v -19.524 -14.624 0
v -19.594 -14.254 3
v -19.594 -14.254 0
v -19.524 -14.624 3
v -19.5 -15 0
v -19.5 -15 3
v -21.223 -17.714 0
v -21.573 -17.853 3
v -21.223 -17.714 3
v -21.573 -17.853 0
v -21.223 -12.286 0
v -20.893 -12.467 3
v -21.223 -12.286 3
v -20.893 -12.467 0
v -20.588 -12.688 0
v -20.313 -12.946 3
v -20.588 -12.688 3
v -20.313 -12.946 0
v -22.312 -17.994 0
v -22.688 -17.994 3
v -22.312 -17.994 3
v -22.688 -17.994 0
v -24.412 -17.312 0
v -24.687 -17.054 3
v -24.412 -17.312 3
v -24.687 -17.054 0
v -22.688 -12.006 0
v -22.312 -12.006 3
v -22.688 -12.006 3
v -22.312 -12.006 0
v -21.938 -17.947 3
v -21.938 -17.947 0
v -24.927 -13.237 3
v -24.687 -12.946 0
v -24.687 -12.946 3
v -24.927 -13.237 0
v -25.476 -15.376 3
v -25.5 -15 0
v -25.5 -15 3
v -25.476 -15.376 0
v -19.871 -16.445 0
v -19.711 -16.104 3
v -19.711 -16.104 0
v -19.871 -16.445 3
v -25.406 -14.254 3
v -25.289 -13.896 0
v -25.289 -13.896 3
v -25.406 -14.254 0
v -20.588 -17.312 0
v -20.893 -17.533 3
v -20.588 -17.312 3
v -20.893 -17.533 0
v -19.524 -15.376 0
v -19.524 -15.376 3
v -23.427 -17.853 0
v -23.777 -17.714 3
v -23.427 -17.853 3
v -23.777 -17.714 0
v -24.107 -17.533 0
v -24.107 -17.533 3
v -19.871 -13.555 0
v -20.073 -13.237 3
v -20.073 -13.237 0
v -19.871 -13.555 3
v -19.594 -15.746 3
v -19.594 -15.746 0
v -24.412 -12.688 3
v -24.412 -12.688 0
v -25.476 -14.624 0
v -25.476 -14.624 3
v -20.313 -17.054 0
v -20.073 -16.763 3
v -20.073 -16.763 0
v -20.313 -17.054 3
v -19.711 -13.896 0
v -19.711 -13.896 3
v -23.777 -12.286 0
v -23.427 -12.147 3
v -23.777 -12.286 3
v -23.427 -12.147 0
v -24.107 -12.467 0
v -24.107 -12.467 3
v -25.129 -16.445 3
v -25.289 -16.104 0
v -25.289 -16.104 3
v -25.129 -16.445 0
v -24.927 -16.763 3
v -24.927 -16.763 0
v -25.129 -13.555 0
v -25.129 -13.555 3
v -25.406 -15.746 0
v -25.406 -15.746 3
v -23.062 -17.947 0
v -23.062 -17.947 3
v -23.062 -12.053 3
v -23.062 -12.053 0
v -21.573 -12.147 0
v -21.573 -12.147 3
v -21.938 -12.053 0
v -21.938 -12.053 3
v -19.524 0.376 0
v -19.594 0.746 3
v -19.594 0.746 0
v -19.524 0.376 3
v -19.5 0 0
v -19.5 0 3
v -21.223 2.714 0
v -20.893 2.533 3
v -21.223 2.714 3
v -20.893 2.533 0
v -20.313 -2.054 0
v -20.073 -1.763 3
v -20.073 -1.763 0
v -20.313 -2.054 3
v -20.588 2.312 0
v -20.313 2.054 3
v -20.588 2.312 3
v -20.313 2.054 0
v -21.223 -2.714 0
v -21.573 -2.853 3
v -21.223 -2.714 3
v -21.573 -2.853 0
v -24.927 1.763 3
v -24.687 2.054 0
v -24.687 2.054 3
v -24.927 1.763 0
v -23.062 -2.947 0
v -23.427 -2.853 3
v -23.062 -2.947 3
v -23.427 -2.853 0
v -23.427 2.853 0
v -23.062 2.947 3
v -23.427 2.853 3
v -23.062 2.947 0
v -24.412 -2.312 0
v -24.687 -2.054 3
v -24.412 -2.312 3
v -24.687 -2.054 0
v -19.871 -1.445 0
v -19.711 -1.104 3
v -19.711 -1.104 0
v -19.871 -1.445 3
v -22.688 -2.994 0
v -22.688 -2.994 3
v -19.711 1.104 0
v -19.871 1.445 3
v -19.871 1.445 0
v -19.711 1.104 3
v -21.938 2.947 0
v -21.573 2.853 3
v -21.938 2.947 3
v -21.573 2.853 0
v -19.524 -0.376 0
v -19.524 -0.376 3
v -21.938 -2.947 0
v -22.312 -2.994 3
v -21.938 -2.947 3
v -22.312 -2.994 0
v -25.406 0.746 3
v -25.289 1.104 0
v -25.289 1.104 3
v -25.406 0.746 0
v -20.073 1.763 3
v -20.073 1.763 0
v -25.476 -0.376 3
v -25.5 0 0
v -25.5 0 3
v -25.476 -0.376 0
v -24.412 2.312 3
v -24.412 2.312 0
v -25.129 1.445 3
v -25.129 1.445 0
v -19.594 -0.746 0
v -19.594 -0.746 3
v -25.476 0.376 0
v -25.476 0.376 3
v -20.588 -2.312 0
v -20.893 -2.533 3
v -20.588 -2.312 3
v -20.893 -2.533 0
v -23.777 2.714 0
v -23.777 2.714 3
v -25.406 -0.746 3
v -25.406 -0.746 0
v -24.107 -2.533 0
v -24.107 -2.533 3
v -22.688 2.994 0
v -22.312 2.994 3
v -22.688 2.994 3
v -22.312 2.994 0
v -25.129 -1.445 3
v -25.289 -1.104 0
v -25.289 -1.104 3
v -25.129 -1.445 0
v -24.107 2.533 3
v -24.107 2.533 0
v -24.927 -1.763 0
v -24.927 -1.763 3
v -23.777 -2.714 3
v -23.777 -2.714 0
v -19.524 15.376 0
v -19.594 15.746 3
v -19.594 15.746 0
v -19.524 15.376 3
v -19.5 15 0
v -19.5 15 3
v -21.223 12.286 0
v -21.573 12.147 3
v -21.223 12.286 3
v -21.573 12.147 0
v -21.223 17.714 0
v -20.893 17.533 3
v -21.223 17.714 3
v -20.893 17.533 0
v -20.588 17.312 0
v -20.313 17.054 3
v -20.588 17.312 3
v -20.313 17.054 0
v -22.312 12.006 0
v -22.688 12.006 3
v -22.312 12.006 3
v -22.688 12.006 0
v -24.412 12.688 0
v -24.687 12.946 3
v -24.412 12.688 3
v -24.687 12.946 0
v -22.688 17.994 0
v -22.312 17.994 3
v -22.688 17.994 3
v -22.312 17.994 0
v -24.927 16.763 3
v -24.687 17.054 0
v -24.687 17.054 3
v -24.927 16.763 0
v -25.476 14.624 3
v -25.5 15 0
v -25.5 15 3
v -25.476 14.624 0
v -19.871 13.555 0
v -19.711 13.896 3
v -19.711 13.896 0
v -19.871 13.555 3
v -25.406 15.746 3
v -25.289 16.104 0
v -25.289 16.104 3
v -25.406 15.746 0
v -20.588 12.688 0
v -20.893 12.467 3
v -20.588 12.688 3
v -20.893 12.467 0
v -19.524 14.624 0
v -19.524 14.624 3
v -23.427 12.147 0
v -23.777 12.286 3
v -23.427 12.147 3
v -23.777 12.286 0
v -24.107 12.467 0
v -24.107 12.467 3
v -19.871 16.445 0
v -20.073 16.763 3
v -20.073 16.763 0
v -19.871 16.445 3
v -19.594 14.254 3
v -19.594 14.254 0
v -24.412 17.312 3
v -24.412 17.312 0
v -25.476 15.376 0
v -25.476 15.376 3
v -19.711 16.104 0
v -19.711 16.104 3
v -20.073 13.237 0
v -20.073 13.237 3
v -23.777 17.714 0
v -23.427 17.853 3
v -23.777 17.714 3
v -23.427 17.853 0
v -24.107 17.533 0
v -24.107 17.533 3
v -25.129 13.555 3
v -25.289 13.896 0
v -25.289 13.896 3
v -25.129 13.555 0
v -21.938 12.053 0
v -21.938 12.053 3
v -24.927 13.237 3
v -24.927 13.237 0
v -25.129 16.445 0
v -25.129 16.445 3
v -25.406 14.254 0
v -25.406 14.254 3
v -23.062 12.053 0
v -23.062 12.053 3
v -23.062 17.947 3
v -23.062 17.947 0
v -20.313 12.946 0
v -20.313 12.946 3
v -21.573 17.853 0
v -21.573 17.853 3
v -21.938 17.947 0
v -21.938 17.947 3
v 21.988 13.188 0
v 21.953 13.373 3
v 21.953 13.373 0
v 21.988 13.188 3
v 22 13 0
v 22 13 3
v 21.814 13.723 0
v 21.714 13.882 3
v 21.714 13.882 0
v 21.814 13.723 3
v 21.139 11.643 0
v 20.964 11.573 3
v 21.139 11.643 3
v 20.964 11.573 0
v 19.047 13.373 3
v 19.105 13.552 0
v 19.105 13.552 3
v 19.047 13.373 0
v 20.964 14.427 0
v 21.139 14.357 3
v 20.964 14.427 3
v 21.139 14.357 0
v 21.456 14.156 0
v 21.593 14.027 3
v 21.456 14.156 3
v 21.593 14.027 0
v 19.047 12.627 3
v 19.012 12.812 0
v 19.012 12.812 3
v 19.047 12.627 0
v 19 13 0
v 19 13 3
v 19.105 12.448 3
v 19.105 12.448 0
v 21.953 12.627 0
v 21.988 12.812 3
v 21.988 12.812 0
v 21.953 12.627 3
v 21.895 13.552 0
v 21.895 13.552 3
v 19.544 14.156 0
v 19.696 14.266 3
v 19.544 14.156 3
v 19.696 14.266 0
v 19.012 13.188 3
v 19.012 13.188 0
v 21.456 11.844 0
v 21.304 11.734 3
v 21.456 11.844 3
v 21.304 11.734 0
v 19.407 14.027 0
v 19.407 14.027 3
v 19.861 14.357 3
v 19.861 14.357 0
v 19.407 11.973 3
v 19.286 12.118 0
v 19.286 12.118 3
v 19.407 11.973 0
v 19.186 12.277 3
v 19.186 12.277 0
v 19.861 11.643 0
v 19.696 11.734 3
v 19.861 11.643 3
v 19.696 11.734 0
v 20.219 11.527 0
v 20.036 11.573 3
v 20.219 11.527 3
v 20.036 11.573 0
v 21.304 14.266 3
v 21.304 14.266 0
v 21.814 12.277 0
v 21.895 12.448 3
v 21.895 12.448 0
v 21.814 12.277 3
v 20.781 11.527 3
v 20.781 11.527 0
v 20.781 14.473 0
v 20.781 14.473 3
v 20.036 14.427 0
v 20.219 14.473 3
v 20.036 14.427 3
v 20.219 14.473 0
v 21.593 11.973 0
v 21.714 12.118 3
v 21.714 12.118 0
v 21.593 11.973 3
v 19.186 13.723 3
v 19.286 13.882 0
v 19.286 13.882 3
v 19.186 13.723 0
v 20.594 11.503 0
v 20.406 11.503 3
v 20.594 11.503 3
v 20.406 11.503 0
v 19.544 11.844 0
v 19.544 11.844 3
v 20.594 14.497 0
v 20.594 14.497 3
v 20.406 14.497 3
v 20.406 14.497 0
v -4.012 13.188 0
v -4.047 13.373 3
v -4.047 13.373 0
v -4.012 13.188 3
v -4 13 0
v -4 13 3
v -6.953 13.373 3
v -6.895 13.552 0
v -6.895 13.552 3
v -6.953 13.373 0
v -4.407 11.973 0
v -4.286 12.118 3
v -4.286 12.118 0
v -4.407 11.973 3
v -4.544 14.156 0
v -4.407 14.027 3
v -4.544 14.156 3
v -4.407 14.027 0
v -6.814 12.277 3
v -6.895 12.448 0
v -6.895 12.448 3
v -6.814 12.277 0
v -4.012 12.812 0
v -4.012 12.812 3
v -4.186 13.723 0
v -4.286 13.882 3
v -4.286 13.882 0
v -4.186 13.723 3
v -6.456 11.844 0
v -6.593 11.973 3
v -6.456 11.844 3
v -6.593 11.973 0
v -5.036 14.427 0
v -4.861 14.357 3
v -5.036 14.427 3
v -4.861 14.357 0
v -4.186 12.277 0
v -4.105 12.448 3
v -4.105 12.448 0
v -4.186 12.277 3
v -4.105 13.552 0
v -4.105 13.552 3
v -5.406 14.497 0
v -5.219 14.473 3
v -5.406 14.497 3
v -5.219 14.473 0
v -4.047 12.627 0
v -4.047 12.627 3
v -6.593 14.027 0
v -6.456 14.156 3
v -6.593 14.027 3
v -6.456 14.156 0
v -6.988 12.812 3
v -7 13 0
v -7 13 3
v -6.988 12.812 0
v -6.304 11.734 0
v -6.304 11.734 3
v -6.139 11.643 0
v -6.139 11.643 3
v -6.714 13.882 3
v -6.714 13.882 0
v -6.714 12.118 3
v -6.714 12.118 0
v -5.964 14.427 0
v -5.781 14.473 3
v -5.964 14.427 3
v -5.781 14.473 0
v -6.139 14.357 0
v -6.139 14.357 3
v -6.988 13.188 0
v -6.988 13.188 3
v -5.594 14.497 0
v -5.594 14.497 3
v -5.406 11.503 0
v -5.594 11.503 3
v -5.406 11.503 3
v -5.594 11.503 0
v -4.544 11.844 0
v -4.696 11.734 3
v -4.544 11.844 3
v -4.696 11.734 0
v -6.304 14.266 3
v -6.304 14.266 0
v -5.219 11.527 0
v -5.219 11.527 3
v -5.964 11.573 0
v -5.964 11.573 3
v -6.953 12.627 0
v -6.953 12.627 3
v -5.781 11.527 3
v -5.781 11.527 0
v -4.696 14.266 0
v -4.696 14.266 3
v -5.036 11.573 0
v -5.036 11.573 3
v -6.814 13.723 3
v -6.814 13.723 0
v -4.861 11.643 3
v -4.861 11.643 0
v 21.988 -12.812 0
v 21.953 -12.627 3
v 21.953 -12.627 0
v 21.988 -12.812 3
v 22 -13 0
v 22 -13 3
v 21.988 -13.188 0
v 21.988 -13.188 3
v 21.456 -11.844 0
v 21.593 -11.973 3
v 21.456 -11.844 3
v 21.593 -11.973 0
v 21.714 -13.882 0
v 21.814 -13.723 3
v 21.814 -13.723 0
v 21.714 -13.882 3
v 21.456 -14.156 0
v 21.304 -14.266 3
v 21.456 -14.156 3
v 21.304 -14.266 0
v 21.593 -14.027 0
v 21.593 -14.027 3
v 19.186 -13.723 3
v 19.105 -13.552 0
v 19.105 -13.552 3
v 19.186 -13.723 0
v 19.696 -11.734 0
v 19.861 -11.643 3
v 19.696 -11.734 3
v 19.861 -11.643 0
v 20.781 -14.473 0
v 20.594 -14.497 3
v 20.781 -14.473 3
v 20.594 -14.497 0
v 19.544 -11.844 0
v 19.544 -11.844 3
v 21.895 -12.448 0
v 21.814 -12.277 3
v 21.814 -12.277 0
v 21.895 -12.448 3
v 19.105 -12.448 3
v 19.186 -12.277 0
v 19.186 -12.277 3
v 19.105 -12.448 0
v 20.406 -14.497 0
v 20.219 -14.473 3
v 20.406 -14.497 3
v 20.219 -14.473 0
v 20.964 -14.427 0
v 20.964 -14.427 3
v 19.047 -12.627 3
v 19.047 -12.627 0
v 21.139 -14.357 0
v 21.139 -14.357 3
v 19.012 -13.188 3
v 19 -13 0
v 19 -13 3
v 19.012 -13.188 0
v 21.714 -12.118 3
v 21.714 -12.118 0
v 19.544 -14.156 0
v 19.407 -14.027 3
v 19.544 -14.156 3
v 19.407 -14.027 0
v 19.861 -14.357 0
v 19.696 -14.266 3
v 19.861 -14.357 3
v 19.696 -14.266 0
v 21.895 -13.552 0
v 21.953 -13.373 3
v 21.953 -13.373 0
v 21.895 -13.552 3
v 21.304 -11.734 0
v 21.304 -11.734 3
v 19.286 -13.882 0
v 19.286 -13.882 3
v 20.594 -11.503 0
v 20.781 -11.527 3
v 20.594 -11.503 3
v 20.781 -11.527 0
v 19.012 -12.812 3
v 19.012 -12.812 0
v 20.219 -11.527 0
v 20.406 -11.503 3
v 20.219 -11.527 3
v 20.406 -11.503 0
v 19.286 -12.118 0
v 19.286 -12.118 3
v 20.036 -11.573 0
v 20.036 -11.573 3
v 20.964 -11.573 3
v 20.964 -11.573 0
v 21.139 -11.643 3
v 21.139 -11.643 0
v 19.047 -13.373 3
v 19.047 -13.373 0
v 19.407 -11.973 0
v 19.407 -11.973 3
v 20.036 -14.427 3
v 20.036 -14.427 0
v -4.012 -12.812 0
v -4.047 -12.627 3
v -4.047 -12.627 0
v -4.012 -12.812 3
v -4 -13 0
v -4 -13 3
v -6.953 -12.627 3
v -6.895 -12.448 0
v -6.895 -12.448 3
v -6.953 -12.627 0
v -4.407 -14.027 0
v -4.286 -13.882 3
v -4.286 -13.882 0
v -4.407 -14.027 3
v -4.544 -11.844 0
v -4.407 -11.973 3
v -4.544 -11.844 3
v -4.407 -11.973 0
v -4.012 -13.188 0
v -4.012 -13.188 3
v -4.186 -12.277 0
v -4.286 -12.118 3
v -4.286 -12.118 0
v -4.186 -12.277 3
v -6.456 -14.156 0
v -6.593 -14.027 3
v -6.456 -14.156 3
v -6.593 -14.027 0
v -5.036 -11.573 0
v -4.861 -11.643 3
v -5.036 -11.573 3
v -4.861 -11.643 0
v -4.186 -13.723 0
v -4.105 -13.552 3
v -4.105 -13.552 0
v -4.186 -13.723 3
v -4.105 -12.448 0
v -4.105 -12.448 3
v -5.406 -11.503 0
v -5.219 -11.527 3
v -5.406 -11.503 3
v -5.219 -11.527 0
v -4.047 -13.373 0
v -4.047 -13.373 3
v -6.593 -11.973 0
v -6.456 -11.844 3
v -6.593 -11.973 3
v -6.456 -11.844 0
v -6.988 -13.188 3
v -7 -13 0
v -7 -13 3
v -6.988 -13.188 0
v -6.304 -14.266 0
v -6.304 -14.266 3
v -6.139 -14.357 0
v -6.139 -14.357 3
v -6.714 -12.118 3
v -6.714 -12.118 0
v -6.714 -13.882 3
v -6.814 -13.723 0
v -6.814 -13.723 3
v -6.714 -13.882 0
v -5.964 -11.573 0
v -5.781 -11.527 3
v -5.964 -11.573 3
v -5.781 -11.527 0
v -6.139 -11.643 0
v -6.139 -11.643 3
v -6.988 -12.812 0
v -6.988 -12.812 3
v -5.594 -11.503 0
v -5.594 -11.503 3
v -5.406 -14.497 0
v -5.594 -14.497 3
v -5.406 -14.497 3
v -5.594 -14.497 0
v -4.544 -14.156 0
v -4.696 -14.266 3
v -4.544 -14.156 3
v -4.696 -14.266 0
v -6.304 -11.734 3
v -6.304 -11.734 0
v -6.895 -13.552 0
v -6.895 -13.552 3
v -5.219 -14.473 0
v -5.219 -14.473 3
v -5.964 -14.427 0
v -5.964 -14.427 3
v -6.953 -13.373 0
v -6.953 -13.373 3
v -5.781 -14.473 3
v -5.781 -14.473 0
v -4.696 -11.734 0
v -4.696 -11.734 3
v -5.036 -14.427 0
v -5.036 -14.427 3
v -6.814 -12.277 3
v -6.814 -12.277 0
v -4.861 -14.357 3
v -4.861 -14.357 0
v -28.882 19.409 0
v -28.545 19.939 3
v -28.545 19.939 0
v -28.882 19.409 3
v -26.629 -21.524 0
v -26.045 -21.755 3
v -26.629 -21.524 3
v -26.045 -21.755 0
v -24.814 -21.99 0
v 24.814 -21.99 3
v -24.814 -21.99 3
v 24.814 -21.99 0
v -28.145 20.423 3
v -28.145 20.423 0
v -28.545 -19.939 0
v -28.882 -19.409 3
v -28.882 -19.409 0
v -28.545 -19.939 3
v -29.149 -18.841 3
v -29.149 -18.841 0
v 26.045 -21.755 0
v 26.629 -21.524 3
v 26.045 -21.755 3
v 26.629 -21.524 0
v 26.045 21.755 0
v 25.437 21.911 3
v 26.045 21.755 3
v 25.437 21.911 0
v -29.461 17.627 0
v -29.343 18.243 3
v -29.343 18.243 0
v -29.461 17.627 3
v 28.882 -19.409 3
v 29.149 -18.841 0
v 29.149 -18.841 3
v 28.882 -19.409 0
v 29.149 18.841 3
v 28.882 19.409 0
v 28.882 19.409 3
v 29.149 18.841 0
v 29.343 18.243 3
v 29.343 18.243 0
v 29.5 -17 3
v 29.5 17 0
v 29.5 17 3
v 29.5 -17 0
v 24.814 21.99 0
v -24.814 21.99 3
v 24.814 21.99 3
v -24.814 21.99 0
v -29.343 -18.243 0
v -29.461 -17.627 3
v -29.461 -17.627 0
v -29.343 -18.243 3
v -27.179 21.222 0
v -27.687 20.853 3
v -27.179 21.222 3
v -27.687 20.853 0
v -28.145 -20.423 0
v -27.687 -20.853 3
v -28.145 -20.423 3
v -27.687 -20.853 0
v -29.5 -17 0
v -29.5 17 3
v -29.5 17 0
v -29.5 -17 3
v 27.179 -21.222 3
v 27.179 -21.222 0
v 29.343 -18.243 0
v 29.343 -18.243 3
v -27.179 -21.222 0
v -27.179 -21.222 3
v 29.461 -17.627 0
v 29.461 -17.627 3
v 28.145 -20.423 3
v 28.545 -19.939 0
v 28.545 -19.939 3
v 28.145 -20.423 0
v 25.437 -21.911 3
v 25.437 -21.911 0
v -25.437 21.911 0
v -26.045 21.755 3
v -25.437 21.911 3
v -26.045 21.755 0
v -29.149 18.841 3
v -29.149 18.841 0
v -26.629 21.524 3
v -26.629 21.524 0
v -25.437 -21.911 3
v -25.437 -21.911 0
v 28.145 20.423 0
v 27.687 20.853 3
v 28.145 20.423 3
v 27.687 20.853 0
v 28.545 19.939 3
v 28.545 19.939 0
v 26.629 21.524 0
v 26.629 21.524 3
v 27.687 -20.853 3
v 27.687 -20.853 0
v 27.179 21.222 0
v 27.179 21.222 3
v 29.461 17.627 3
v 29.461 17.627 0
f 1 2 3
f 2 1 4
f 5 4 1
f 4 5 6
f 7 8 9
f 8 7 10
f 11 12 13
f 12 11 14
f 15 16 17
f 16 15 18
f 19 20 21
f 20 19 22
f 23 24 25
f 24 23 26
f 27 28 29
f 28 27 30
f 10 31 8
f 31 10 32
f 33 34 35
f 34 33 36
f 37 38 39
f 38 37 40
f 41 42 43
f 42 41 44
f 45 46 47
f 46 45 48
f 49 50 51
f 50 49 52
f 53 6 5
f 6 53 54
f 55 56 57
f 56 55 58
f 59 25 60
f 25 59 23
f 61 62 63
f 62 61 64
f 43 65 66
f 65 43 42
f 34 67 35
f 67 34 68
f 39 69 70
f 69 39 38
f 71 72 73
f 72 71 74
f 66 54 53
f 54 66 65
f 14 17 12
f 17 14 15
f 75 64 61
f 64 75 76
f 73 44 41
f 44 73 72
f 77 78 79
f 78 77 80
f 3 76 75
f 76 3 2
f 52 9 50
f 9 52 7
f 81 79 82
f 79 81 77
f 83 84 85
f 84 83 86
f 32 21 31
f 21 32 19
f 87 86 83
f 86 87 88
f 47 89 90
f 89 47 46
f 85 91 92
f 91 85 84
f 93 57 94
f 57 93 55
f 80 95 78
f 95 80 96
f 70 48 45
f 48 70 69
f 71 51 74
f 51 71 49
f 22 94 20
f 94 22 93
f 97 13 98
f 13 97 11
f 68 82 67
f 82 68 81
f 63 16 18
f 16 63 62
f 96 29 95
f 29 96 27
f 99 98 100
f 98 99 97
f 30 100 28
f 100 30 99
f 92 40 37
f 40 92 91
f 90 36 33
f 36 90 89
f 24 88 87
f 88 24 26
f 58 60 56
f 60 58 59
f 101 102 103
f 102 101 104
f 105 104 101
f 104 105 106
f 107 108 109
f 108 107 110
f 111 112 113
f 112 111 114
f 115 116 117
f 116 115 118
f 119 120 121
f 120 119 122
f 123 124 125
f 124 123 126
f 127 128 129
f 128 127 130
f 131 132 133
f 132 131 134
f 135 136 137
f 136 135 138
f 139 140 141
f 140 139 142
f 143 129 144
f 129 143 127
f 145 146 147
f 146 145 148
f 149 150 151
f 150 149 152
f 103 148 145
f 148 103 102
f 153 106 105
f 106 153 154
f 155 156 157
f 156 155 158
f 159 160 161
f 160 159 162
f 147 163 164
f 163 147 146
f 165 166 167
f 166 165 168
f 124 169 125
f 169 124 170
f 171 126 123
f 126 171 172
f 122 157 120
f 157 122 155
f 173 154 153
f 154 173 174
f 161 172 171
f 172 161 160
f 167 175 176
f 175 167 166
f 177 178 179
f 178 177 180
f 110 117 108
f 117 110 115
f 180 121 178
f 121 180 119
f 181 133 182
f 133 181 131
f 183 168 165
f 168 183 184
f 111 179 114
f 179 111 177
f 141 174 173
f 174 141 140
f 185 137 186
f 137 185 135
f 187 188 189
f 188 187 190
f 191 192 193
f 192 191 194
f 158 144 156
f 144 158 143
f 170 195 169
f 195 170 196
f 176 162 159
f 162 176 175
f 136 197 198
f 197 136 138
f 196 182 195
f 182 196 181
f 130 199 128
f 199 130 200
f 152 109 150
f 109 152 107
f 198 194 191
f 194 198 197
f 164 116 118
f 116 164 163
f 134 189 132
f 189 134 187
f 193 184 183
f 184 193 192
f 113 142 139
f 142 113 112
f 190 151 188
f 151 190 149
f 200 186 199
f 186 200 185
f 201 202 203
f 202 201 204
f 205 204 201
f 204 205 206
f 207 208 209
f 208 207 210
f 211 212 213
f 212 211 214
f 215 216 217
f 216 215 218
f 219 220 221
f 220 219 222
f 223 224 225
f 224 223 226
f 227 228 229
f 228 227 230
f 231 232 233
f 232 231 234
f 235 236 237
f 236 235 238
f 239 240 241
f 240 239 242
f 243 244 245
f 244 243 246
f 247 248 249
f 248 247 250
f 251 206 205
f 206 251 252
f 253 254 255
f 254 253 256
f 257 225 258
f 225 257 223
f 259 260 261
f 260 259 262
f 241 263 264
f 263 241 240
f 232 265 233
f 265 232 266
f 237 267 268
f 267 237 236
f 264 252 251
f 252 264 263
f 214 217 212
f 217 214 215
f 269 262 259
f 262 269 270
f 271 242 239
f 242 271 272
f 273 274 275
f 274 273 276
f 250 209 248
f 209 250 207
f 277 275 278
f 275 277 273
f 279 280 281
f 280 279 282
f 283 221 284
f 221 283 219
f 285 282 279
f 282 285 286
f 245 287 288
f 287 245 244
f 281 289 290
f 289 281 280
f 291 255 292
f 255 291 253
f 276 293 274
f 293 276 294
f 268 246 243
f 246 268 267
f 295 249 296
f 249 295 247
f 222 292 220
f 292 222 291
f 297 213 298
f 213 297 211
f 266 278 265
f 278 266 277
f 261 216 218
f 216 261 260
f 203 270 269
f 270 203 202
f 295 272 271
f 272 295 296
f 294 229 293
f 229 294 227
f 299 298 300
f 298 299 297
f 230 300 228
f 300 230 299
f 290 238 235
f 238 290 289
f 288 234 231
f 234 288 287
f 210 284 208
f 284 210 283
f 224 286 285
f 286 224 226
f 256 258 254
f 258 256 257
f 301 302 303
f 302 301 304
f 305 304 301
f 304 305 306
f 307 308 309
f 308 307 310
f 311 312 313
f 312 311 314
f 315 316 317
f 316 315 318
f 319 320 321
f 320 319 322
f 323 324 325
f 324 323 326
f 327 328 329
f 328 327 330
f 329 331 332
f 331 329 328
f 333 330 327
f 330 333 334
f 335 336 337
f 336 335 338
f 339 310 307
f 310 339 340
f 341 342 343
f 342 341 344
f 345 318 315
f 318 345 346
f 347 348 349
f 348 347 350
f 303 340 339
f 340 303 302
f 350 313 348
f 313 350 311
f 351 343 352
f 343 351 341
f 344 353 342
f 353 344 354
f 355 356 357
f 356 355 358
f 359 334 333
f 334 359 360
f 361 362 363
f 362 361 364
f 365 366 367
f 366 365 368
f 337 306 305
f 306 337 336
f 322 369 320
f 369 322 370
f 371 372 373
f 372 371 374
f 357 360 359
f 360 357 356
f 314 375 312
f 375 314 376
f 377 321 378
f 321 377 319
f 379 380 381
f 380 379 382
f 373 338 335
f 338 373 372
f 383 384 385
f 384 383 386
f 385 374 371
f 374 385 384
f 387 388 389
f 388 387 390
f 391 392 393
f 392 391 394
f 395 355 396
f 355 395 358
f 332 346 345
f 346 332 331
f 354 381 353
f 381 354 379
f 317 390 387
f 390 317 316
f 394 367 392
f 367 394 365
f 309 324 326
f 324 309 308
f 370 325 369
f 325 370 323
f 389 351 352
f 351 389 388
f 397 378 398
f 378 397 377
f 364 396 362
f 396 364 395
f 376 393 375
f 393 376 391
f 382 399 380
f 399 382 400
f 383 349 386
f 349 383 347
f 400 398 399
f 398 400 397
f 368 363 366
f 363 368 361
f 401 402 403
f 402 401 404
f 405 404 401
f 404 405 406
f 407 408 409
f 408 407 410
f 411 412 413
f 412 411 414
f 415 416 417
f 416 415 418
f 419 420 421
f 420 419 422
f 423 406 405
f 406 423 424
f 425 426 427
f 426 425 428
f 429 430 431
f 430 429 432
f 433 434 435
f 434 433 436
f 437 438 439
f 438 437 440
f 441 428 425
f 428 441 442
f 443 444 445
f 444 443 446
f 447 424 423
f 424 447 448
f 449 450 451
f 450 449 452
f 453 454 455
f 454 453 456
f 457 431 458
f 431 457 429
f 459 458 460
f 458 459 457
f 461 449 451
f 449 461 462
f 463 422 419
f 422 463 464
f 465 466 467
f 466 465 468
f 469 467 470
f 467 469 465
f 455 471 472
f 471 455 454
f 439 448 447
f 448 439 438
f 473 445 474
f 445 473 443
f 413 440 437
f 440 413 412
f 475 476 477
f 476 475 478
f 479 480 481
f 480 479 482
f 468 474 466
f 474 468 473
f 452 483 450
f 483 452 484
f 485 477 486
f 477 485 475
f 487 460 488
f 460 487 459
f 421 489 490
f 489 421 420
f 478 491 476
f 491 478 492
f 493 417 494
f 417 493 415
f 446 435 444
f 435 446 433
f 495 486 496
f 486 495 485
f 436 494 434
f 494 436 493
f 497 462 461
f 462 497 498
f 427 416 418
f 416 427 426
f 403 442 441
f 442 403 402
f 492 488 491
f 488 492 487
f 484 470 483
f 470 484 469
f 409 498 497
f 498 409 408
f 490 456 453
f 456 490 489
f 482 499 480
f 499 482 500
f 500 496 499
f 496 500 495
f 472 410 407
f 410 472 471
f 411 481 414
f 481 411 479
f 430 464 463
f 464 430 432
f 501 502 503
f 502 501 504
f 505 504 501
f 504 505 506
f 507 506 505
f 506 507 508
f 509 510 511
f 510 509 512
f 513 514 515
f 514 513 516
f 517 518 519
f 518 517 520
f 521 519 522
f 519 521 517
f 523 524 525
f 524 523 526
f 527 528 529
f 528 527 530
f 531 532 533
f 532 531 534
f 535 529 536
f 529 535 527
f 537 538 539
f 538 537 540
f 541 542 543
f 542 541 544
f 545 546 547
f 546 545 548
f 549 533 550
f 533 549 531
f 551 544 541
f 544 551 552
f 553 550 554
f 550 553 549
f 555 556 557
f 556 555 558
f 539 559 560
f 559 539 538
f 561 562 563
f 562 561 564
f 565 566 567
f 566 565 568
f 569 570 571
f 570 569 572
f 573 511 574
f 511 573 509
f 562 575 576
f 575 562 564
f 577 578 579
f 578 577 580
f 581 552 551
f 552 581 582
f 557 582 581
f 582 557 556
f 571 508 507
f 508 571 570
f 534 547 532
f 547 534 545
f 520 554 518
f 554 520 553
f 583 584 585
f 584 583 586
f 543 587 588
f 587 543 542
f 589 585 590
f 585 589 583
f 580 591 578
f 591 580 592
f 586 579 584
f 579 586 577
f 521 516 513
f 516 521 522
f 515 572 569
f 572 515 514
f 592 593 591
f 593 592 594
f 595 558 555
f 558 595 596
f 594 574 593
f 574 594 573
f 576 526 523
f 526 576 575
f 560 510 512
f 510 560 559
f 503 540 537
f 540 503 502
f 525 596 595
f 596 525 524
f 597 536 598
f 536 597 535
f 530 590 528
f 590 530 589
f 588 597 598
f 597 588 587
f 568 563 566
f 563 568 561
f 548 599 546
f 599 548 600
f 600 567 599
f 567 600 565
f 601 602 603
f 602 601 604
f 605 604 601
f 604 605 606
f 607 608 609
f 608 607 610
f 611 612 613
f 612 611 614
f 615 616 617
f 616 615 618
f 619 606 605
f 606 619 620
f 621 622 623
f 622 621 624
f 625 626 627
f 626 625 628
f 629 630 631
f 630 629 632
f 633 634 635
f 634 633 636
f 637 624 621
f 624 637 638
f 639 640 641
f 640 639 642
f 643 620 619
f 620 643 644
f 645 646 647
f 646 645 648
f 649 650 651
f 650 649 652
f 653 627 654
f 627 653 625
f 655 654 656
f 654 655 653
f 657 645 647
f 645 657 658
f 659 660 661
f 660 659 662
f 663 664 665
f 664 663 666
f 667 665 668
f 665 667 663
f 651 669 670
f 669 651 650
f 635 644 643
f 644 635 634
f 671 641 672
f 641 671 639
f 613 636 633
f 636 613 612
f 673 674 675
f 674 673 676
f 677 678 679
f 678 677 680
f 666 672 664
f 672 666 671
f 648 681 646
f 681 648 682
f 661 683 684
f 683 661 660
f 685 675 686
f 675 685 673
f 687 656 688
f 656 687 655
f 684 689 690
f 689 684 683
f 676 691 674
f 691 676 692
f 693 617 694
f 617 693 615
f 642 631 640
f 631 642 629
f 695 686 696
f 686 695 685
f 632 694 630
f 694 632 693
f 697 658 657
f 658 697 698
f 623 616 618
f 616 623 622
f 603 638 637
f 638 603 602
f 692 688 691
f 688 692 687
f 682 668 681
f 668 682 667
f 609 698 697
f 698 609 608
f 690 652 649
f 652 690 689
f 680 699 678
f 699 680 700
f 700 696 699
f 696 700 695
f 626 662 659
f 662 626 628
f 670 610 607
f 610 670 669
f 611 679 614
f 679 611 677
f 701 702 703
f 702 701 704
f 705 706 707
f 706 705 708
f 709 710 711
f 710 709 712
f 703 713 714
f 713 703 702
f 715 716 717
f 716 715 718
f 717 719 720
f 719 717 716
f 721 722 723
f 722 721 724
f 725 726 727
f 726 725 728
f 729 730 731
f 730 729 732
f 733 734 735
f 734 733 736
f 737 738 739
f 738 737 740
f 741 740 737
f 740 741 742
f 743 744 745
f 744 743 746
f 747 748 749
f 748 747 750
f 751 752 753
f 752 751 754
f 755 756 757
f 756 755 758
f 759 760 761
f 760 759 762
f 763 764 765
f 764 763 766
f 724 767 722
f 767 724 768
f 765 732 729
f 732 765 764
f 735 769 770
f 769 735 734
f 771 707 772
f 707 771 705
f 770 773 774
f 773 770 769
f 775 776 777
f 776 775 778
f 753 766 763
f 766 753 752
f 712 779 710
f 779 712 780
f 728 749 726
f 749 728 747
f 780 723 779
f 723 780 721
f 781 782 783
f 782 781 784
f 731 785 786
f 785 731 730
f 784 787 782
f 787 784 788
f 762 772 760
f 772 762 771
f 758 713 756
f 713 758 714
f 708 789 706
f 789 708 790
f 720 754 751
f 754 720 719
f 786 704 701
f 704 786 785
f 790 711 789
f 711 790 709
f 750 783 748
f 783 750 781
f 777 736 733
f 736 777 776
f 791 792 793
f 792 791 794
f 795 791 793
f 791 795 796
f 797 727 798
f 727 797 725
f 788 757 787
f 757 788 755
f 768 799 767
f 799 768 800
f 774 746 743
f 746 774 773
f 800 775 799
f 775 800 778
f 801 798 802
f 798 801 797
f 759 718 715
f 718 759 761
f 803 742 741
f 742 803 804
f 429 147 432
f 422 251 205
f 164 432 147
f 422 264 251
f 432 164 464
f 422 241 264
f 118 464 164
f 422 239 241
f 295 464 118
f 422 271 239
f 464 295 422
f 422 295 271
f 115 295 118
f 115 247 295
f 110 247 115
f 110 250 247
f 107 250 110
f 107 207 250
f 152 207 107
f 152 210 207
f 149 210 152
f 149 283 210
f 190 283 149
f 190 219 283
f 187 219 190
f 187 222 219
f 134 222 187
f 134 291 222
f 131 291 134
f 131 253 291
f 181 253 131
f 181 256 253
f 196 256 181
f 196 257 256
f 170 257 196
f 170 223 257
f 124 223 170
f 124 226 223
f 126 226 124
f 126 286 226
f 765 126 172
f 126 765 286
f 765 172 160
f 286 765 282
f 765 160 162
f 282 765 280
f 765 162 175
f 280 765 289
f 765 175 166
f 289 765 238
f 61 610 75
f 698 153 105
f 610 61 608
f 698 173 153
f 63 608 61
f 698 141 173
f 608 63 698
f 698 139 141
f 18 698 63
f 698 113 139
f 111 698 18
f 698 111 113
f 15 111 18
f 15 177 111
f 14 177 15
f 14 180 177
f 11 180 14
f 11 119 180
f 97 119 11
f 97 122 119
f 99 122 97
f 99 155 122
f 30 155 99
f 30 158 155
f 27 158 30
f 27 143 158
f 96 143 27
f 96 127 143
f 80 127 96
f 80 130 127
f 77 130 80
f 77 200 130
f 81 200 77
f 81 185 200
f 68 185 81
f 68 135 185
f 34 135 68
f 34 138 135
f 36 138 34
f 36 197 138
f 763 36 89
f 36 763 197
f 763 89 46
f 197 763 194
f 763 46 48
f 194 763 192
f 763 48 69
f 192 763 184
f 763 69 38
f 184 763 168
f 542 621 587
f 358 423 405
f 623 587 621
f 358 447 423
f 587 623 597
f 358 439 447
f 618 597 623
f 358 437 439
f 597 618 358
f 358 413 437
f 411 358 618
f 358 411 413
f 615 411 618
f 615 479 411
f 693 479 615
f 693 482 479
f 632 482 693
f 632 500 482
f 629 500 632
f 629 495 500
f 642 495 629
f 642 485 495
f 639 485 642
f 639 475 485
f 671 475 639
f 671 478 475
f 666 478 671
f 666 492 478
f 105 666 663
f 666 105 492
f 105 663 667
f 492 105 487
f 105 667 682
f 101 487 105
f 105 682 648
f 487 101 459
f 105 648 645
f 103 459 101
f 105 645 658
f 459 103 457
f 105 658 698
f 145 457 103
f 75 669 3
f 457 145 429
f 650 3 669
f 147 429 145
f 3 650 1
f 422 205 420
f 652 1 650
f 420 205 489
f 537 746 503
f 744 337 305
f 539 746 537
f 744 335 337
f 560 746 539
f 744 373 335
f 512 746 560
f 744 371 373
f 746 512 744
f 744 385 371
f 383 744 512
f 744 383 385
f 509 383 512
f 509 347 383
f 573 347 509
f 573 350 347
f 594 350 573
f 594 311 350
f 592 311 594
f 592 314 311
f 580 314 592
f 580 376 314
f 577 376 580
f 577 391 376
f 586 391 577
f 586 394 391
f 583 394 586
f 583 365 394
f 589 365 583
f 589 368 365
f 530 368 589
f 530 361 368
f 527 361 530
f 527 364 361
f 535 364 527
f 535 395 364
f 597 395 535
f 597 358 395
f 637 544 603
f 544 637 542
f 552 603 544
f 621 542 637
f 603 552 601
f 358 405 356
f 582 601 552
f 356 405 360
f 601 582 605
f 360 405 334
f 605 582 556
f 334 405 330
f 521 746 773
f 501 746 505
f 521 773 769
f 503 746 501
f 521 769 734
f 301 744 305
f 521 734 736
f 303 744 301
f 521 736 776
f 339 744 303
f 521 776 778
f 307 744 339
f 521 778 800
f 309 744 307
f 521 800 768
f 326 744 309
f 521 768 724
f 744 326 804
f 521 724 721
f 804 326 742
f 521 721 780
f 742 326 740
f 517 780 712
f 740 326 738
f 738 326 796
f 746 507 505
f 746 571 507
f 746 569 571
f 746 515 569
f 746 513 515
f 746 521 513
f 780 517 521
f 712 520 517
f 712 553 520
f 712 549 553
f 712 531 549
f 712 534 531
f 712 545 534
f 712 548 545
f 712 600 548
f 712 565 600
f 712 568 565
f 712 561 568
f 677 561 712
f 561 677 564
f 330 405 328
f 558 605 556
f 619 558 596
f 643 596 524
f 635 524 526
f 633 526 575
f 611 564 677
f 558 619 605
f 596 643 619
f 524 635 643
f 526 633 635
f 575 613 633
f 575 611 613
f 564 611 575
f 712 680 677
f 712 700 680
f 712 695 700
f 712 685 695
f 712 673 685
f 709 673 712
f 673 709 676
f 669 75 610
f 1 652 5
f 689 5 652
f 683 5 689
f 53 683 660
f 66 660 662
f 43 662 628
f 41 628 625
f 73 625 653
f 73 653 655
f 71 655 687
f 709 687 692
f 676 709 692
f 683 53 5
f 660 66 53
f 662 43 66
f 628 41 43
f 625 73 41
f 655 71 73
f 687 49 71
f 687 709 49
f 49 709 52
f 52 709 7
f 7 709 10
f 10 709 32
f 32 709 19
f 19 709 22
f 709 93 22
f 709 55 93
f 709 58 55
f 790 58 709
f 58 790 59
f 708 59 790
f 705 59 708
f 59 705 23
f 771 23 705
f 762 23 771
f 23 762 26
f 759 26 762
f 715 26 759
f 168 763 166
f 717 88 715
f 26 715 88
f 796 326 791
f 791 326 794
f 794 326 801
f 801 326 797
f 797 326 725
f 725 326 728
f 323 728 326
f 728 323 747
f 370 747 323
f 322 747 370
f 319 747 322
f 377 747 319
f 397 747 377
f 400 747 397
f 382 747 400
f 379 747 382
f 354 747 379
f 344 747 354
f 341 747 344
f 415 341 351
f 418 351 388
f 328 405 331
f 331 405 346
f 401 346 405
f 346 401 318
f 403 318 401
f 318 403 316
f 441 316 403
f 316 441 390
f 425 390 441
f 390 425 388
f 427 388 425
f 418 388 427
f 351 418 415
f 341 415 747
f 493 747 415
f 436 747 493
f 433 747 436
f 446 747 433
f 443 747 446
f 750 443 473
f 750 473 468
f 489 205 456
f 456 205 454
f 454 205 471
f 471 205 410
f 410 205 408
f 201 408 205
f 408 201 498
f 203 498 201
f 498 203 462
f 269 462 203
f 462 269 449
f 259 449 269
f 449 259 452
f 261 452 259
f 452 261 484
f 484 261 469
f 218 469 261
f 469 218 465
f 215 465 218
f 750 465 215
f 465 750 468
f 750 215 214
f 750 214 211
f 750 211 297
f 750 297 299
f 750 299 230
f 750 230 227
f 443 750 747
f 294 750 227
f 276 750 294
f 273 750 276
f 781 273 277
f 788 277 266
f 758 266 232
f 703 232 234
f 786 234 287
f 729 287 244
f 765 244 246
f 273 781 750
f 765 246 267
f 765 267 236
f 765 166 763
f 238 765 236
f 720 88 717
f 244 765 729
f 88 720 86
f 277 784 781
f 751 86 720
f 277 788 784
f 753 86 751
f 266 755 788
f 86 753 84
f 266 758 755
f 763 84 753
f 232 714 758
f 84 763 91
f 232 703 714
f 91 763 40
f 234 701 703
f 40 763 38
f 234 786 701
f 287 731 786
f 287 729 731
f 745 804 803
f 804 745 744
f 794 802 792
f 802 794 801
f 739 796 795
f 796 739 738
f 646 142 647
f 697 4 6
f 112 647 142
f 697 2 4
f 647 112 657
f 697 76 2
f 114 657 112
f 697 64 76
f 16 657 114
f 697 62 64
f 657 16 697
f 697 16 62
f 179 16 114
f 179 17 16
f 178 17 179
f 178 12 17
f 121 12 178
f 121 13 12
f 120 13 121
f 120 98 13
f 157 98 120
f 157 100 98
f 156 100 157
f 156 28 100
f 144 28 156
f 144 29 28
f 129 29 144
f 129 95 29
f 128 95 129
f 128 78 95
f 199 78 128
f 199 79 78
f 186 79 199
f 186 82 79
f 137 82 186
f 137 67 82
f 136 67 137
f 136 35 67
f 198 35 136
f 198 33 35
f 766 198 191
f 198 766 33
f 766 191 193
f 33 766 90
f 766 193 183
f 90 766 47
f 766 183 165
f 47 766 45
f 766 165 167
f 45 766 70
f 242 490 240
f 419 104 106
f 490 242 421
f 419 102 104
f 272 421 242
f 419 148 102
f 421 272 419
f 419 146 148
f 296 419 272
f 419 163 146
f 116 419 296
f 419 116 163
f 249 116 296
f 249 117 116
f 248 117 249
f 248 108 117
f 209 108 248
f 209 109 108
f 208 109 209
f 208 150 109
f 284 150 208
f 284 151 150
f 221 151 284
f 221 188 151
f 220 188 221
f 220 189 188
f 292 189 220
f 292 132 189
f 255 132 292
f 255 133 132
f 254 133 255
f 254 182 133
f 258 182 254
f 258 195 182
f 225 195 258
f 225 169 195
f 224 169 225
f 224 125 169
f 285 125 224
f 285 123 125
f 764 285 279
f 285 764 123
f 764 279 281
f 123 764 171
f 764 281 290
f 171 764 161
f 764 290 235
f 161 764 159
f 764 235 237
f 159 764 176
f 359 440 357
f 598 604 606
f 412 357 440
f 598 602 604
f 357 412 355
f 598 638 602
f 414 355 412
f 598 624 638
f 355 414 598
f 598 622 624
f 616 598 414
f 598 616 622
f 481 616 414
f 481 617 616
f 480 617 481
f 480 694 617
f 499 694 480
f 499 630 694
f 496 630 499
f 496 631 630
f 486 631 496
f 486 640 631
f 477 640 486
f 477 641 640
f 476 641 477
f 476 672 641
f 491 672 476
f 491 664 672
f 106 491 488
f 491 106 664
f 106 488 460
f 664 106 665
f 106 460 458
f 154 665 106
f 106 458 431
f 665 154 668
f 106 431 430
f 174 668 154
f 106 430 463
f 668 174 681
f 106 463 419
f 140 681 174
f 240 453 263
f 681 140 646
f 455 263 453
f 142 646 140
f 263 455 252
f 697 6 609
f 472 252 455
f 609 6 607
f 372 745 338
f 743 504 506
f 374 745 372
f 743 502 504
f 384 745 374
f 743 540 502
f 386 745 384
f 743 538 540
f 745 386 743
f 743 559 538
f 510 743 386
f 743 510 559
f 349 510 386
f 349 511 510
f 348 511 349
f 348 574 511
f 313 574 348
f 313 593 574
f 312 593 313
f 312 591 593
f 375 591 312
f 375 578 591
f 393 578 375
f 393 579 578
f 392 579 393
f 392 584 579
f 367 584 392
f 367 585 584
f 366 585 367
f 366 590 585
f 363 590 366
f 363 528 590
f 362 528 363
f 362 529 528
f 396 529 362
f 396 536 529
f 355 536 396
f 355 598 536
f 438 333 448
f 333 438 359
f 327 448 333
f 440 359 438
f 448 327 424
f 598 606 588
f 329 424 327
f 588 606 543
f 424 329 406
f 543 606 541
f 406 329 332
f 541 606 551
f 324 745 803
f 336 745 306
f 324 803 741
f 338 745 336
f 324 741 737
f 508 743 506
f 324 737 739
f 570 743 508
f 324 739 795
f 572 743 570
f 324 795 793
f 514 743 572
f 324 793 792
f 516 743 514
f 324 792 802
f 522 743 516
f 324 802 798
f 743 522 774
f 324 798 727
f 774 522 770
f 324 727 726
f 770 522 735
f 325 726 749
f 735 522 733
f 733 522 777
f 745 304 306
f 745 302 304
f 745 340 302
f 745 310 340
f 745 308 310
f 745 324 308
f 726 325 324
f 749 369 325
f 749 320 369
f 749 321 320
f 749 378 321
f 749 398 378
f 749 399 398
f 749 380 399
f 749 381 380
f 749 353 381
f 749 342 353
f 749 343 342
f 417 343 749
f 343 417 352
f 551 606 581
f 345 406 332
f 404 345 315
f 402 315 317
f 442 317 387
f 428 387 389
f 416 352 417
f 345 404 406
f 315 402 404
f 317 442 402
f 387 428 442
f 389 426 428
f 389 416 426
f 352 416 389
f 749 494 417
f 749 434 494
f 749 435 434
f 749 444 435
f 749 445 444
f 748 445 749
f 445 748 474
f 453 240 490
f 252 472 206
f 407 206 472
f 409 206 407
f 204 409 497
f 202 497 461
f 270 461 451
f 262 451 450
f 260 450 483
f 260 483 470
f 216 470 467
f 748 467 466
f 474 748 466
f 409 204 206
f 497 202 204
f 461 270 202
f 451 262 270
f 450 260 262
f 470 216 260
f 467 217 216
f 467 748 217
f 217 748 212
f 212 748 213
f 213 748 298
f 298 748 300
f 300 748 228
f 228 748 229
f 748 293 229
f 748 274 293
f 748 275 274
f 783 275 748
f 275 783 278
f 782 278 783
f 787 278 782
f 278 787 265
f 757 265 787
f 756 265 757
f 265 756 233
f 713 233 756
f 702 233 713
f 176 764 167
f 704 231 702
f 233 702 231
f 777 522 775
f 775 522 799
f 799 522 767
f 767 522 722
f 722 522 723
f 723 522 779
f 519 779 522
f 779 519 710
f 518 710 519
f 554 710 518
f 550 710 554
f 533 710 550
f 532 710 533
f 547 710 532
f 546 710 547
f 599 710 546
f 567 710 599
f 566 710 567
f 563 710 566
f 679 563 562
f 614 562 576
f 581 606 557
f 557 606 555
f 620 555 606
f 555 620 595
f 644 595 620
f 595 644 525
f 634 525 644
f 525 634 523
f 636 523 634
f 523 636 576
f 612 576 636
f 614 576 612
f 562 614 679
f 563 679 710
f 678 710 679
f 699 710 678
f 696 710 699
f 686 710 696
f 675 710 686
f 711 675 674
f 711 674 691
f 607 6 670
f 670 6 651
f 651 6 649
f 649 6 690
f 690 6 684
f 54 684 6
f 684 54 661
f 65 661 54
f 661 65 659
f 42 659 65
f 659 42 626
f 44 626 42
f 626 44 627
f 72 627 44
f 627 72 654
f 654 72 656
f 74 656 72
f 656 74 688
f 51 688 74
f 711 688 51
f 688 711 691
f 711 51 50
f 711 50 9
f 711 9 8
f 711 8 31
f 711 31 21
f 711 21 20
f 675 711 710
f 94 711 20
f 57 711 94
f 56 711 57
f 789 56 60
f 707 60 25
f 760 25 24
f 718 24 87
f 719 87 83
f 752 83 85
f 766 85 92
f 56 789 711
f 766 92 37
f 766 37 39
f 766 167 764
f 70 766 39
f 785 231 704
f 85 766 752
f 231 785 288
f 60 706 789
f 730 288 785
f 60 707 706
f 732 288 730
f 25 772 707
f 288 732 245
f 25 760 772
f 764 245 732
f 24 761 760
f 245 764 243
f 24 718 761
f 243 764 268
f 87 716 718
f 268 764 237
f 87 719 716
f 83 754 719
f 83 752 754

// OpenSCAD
$fn = 50;


difference() {
	union() {
		translate(v = [0, 0, 0]) {
			rotate(a = [0, 0, 0]) {
				hull() {
					translate(v = [-24.5000000000, 17.0000000000, 0]) {
						rotate(a = [0, 0, 0]) {
							translate(v = [0, 0, 0]) {
								rotate(a = [0, 0, 0]) {
									cylinder(h = 3, r = 5);
								}
							}
						}
					}
					translate(v = [24.5000000000, 17.0000000000, 0]) {
						rotate(a = [0, 0, 0]) {
							translate(v = [0, 0, 0]) {
								rotate(a = [0, 0, 0]) {
									cylinder(h = 3, r = 5);
								}
							}
						}
					}
					translate(v = [-24.5000000000, -17.0000000000, 0]) {
						rotate(a = [0, 0, 0]) {
							translate(v = [0, 0, 0]) {
								rotate(a = [0, 0, 0]) {
									cylinder(h = 3, r = 5);
								}
							}
						}
					}
					translate(v = [24.5000000000, -17.0000000000, 0]) {
						rotate(a = [0, 0, 0]) {
							translate(v = [0, 0, 0]) {
								rotate(a = [0, 0, 0]) {
									cylinder(h = 3, r = 5);
								}
							}
						}
					}
				}
			}
		}
	}
	union() {
		translate(v = [-22.5000000000, -15.0000000000, -125.0000000000]) {
			rotate(a = [0, 0, 0]) {
				cylinder(h = 250, r = 3.0000000000);
			}
		}
		translate(v = [-22.5000000000, 0.0000000000, -125.0000000000]) {
			rotate(a = [0, 0, 0]) {
				cylinder(h = 250, r = 3.0000000000);
			}
		}
		translate(v = [-22.5000000000, 15.0000000000, -125.0000000000]) {
			rotate(a = [0, 0, 0]) {
				cylinder(h = 250, r = 3.0000000000);
			}
		}
		translate(v = [20.5000000000, 13.0000000000, -125.0000000000]) {
			rotate(a = [0, 0, 0]) {
				cylinder(h = 250, r = 1.5000000000);
			}
		}
		translate(v = [-5.5000000000, 13.0000000000, -125.0000000000]) {
			rotate(a = [0, 0, 0]) {
				cylinder(h = 250, r = 1.5000000000);
			}
		}
		translate(v = [20.5000000000, -13.0000000000, -125.0000000000]) {
			rotate(a = [0, 0, 0]) {
				cylinder(h = 250, r = 1.5000000000);
			}
		}
		translate(v = [-5.5000000000, -13.0000000000, -125.0000000000]) {
			rotate(a = [0, 0, 0]) {
				cylinder(h = 250, r = 1.5000000000);
			}
		}
	}
}
